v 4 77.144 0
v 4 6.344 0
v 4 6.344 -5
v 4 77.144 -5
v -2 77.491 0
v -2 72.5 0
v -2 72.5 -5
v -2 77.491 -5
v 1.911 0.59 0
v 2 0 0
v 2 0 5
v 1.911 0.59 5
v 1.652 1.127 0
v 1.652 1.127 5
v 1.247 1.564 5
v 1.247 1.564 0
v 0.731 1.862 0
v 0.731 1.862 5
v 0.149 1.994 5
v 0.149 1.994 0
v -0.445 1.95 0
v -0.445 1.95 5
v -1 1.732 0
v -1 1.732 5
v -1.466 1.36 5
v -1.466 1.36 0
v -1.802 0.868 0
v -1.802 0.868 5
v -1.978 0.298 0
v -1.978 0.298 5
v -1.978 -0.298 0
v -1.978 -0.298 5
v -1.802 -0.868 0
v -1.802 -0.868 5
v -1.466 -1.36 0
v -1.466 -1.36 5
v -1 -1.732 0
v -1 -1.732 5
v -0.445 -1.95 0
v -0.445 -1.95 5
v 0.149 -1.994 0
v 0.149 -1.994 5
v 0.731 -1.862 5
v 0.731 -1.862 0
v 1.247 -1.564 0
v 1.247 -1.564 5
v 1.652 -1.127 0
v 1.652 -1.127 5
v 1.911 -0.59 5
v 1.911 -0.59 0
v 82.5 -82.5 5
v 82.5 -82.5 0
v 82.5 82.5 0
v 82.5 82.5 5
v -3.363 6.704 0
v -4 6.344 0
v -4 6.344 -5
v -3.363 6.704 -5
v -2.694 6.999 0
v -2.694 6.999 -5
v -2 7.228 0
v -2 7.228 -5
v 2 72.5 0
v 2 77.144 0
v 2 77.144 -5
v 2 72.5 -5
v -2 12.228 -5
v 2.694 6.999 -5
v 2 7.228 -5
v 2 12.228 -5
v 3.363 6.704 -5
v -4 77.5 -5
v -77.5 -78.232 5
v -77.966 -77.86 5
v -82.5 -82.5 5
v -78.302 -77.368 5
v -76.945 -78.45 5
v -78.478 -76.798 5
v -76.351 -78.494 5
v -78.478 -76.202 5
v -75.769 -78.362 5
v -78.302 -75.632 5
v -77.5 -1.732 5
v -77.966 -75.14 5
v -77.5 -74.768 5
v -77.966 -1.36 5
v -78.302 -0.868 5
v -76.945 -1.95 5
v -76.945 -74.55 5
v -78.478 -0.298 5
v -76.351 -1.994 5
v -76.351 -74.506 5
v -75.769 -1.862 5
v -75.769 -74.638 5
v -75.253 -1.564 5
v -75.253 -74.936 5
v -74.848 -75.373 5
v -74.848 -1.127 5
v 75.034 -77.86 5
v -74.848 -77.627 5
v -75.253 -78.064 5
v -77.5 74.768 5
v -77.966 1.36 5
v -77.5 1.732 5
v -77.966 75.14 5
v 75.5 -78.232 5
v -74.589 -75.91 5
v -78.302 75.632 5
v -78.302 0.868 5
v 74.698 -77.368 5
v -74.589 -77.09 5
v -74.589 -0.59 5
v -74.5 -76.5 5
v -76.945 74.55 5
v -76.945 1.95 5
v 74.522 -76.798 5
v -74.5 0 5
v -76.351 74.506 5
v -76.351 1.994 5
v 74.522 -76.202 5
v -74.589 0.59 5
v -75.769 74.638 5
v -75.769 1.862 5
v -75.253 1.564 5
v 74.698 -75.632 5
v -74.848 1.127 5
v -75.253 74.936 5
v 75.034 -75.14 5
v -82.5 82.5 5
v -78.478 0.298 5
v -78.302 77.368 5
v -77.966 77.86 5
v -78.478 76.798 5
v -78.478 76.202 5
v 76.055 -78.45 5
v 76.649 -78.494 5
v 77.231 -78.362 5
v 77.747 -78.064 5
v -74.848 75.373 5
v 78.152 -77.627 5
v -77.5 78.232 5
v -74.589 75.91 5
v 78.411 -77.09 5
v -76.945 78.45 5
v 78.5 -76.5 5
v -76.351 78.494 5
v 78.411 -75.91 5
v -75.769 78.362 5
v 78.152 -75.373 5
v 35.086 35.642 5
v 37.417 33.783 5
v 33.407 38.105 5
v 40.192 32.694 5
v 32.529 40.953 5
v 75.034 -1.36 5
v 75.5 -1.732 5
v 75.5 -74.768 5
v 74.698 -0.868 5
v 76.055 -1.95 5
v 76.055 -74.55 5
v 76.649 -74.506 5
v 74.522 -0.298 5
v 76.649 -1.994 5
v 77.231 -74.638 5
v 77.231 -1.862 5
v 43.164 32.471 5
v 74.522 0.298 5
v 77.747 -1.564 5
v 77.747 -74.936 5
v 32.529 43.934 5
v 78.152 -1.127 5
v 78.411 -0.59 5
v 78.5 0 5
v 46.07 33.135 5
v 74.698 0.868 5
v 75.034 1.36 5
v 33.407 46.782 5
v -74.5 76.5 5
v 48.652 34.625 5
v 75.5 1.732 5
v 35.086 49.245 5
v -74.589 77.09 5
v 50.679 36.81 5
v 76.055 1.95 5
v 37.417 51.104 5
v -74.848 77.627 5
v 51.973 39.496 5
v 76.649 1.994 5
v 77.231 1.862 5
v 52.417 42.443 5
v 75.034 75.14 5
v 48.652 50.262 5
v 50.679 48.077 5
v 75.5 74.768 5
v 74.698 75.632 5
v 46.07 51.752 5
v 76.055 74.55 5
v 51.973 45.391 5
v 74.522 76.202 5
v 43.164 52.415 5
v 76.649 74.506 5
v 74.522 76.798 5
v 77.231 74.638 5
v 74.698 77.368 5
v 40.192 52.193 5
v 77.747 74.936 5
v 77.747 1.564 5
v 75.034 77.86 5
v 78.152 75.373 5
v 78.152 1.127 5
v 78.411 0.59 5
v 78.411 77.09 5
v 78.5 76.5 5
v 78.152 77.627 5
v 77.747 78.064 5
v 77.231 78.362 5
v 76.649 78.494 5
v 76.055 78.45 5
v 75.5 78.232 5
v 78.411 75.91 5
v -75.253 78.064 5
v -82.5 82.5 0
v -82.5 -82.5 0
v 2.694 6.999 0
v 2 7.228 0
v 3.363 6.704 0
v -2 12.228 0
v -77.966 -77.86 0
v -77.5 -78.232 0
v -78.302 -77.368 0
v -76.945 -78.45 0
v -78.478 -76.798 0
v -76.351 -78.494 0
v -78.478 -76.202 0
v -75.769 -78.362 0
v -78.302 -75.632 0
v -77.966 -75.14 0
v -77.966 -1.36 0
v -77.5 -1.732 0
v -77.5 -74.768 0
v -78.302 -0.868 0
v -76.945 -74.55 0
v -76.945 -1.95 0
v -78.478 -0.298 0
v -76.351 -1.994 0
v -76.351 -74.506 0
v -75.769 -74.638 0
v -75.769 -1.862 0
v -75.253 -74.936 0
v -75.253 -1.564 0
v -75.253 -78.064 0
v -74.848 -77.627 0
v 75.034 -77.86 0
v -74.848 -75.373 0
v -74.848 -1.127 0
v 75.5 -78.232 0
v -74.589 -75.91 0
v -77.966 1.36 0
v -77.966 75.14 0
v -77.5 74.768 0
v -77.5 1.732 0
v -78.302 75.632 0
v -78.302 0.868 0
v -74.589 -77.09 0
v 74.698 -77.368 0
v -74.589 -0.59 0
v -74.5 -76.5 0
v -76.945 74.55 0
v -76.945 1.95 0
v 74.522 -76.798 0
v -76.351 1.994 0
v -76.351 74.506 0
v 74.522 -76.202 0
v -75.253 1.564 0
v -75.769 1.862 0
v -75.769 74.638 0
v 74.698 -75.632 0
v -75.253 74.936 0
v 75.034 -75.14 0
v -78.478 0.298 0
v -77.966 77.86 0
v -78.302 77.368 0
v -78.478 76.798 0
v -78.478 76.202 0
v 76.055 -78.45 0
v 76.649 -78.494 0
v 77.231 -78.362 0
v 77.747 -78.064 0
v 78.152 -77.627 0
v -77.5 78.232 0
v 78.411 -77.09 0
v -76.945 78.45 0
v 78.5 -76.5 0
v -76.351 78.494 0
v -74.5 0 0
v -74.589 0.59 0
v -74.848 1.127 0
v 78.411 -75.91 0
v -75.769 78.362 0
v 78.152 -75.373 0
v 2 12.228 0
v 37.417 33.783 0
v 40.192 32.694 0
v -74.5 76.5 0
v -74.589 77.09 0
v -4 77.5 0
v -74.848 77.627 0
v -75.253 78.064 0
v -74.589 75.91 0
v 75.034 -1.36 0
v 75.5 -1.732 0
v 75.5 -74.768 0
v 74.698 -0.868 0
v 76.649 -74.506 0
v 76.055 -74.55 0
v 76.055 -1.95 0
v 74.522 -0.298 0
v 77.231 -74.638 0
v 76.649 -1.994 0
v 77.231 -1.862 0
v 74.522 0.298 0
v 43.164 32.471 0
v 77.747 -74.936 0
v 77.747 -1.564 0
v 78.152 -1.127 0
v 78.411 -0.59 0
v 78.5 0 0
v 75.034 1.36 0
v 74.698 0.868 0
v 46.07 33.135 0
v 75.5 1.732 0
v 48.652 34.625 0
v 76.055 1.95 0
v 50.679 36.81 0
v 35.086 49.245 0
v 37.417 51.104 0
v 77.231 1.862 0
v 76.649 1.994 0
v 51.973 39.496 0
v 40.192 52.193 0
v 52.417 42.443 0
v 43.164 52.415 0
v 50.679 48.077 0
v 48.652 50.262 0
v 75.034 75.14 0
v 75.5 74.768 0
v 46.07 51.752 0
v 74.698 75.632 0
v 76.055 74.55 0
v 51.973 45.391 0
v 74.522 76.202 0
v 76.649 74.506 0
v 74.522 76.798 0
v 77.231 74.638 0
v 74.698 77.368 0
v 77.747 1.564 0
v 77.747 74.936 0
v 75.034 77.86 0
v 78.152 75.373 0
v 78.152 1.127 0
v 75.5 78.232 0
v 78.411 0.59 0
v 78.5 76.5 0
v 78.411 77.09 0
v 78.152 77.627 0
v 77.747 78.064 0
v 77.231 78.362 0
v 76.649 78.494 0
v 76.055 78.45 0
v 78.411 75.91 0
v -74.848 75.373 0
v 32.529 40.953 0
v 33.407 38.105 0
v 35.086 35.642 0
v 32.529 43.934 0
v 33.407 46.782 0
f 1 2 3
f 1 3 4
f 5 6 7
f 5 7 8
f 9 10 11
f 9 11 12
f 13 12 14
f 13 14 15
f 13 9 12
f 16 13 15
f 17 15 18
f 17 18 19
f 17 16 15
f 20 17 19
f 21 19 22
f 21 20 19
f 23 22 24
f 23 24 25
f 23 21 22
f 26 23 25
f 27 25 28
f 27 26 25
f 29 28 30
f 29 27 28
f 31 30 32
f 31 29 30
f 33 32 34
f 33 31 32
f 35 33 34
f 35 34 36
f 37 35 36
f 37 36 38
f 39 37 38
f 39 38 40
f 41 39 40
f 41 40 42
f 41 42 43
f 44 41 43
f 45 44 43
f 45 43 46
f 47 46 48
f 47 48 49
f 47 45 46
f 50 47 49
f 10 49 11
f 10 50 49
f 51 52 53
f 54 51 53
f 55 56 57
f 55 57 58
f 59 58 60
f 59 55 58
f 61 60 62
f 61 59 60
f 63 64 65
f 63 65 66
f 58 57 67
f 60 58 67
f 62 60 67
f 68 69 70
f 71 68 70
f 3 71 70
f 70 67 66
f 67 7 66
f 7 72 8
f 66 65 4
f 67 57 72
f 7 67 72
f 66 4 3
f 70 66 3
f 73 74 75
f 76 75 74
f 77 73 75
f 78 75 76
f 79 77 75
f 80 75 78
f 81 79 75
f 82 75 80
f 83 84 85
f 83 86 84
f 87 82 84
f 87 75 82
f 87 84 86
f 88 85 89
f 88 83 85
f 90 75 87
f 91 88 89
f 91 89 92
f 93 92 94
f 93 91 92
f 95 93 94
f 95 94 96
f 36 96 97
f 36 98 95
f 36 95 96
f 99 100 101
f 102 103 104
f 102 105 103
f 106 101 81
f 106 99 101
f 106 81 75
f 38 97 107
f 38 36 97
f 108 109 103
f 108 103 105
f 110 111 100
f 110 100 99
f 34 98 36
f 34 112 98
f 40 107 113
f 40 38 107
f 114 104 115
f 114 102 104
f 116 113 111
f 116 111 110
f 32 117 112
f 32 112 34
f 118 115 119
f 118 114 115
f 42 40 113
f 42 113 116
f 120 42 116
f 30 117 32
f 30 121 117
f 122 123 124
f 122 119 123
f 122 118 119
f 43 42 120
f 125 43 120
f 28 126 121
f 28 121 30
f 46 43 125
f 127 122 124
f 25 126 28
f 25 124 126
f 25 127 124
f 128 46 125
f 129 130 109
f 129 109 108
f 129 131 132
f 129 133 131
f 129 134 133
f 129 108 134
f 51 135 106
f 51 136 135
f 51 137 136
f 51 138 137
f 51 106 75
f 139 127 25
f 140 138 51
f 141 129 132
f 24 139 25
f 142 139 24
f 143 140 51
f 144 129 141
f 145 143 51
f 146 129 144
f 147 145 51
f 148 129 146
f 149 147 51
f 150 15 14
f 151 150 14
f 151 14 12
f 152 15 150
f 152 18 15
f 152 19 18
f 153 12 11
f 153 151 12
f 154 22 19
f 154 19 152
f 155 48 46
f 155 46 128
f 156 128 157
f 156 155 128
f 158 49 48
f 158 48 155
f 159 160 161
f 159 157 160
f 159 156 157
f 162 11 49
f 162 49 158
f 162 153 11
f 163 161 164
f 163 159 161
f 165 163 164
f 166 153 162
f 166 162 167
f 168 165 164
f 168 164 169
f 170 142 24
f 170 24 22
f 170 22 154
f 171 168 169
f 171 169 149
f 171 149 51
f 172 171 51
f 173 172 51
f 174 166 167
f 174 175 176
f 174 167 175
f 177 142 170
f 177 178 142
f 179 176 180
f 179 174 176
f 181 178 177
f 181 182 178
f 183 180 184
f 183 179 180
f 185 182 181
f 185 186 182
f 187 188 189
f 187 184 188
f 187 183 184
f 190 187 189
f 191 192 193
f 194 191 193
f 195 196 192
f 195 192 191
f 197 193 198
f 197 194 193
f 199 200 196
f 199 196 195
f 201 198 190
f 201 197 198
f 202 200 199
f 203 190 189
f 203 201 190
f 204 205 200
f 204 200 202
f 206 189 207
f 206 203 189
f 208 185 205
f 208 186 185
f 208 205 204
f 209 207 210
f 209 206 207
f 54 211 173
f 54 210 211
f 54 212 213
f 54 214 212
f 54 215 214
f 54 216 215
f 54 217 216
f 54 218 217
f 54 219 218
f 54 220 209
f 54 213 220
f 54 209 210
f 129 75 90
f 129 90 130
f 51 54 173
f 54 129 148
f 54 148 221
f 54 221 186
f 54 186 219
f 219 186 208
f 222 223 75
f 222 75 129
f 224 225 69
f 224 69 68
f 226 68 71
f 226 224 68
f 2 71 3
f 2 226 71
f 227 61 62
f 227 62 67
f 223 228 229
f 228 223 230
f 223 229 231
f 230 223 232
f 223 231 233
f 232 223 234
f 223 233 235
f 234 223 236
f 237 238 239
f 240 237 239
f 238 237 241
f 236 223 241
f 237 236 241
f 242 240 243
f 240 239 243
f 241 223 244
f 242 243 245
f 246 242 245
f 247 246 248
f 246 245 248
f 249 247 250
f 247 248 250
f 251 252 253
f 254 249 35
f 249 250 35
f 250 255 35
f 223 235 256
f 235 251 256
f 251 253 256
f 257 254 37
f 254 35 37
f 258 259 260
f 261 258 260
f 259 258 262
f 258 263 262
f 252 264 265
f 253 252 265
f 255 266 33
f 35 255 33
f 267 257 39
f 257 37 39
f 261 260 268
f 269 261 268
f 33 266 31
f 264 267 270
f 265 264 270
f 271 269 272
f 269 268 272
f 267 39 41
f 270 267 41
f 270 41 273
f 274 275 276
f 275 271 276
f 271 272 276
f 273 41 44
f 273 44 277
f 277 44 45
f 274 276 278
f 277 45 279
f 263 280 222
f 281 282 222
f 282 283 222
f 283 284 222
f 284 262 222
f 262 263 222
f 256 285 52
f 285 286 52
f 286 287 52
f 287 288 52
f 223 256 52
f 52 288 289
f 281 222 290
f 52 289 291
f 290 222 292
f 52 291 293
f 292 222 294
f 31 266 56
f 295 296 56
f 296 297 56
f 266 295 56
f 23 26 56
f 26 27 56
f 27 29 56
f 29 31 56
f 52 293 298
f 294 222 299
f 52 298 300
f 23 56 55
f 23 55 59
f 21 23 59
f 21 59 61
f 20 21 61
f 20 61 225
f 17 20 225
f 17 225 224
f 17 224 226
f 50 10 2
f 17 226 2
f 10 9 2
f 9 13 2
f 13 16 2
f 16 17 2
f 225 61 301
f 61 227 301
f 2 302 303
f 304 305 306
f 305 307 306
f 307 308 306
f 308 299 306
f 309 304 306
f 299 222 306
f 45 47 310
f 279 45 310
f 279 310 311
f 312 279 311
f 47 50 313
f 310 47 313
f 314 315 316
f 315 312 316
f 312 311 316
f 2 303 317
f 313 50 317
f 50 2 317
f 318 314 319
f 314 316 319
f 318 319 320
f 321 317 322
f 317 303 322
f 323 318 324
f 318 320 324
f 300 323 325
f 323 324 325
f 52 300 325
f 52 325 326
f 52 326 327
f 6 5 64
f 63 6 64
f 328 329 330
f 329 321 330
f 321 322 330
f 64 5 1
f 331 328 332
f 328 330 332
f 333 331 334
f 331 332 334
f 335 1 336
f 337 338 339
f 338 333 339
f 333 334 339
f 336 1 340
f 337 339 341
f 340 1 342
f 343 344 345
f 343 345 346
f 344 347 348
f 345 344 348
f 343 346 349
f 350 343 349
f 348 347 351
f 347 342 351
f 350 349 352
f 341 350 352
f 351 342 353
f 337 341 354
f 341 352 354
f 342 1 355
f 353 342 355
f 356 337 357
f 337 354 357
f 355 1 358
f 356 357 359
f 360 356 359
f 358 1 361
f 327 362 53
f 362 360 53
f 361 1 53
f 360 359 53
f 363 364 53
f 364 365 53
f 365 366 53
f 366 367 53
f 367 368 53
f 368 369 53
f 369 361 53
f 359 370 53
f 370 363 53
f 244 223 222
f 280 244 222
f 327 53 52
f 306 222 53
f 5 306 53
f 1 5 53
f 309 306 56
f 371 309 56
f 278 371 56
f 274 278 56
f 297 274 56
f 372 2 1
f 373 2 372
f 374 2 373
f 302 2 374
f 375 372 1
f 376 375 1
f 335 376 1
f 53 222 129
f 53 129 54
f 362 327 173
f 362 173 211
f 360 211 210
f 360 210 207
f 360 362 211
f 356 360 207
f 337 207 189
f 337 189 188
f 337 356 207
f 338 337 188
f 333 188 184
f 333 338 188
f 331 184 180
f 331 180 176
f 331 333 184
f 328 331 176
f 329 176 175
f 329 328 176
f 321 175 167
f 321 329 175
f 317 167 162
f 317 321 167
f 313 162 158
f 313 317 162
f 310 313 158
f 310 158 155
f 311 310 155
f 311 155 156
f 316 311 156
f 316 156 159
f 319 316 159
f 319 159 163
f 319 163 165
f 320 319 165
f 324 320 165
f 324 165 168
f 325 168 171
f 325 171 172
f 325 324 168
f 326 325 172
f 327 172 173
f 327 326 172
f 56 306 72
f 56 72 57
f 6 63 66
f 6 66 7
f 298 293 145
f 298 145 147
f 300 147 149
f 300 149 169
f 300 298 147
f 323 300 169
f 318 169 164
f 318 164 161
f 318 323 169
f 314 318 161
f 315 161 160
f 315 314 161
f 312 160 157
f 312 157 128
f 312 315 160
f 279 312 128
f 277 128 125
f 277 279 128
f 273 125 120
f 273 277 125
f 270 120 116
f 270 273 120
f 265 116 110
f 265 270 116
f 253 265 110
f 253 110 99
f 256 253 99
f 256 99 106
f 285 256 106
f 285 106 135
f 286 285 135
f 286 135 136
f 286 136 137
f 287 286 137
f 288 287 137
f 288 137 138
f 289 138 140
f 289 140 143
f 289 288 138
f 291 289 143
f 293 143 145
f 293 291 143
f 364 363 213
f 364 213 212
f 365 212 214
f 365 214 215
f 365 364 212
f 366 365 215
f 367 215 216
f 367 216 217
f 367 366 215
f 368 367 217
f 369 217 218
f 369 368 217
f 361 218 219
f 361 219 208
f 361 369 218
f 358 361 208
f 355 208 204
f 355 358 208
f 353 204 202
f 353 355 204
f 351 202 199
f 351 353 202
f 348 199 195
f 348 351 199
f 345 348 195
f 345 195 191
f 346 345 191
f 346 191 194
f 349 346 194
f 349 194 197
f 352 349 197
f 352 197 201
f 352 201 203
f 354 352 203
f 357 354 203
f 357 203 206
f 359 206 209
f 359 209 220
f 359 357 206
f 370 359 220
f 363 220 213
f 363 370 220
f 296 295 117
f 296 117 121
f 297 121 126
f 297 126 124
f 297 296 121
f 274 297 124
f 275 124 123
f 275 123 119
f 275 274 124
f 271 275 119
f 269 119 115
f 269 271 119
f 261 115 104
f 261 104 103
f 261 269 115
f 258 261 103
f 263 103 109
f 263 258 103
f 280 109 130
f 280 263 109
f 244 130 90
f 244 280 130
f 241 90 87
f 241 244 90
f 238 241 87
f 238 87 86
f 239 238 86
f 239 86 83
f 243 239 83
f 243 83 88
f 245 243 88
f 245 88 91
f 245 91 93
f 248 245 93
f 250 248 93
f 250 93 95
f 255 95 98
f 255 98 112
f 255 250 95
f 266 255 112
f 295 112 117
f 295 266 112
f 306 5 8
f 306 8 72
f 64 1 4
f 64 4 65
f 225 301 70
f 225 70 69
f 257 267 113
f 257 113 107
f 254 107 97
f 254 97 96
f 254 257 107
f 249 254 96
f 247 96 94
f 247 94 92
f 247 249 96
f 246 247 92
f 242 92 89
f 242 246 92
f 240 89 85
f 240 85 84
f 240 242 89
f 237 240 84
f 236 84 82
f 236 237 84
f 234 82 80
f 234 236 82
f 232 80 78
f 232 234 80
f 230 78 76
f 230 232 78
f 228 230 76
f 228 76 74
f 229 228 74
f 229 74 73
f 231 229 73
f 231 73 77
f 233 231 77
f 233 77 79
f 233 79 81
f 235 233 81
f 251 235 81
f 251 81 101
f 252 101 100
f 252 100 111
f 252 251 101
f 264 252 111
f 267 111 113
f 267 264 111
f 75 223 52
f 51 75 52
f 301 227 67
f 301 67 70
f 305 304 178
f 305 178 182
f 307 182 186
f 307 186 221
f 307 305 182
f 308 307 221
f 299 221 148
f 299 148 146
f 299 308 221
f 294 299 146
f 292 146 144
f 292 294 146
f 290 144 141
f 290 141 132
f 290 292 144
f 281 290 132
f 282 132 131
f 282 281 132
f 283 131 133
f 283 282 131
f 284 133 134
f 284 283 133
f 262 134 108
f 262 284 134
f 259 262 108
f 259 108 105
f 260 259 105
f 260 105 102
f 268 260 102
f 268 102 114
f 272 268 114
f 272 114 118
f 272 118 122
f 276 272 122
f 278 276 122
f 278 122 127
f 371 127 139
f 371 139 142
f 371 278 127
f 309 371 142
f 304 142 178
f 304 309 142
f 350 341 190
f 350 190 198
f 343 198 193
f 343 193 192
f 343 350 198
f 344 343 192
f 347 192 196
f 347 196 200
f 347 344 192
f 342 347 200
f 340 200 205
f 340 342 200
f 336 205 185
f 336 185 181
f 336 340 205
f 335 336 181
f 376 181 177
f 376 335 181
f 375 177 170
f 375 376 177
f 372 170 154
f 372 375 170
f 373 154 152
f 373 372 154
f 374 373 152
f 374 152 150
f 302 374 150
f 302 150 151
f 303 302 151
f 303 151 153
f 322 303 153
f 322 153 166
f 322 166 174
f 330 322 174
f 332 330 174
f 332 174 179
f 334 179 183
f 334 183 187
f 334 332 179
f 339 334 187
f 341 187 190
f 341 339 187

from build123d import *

# Parameters (mm, degrees)
ESQUISSE1_W        = 165
ESQUISSE1_H        = 165
ESQUISSE1_R        = 2
ESQUISSE1_R_2      = 10
BOSS_EXTRU_1_DEPTH = 5
BOSS_EXTRU_2_DEPTH = 5


with BuildPart() as part:
    # Esquisse1 → Boss.-Extru.1 (new body)
    with BuildSketch(Plane.XY):
        Rectangle(ESQUISSE1_W, ESQUISSE1_H)
        with Locations((-76.5, 76.5)):
            Circle(ESQUISSE1_R, mode=Mode.SUBTRACT)
        with Locations((-76.5, 0)):
            Circle(ESQUISSE1_R, mode=Mode.SUBTRACT)
        with Locations((-76.5, -76.5)):
            Circle(ESQUISSE1_R, mode=Mode.SUBTRACT)
        with Locations((76.5, -76.5)):
            Circle(ESQUISSE1_R, mode=Mode.SUBTRACT)
        with Locations((76.5, 0)):
            Circle(ESQUISSE1_R, mode=Mode.SUBTRACT)
        with Locations((76.5, 76.5)):
            Circle(ESQUISSE1_R, mode=Mode.SUBTRACT)
        Circle(ESQUISSE1_R, mode=Mode.SUBTRACT)
        with Locations((42.41686608, 42.443425371)):
            Circle(ESQUISSE1_R_2, mode=Mode.SUBTRACT)
    extrude(amount=BOSS_EXTRU_1_DEPTH)

    # Esquisse2 → Boss.-Extru.2 (add)
    with BuildSketch(Plane(origin=(0, 0, 0), x_dir=(-1, 0, 0), z_dir=(0, 0, -1))):
        with BuildLine():
            Line((4, 77.5), (4, 6.34428877))
            ThreePointArc((4, 6.34428877), (3.032395143, 6.859634079), (2, 7.228416147))
            Line((2, 7.228416147), (2, 12.228416147))
            Line((2, 12.228416147), (-2, 12.228416147))
            Line((-2, 12.228416147), (-2, 7.228416147))
            ThreePointArc((-2, 7.228416147), (-3.032395143, 6.859634079), (-4, 6.34428877))
            Line((-4, 6.34428877), (-4, 77.143871387))
            Line((-4, 77.143871387), (-2, 77.143871387))
            Line((-2, 77.143871387), (-2, 72.5))
            Line((-2, 72.5), (2, 72.5))
            Line((2, 72.5), (2, 77.491359298))
            Line((2, 77.491359298), (4, 77.5))
        make_face()
    extrude(amount=BOSS_EXTRU_2_DEPTH)


solid = part.part
